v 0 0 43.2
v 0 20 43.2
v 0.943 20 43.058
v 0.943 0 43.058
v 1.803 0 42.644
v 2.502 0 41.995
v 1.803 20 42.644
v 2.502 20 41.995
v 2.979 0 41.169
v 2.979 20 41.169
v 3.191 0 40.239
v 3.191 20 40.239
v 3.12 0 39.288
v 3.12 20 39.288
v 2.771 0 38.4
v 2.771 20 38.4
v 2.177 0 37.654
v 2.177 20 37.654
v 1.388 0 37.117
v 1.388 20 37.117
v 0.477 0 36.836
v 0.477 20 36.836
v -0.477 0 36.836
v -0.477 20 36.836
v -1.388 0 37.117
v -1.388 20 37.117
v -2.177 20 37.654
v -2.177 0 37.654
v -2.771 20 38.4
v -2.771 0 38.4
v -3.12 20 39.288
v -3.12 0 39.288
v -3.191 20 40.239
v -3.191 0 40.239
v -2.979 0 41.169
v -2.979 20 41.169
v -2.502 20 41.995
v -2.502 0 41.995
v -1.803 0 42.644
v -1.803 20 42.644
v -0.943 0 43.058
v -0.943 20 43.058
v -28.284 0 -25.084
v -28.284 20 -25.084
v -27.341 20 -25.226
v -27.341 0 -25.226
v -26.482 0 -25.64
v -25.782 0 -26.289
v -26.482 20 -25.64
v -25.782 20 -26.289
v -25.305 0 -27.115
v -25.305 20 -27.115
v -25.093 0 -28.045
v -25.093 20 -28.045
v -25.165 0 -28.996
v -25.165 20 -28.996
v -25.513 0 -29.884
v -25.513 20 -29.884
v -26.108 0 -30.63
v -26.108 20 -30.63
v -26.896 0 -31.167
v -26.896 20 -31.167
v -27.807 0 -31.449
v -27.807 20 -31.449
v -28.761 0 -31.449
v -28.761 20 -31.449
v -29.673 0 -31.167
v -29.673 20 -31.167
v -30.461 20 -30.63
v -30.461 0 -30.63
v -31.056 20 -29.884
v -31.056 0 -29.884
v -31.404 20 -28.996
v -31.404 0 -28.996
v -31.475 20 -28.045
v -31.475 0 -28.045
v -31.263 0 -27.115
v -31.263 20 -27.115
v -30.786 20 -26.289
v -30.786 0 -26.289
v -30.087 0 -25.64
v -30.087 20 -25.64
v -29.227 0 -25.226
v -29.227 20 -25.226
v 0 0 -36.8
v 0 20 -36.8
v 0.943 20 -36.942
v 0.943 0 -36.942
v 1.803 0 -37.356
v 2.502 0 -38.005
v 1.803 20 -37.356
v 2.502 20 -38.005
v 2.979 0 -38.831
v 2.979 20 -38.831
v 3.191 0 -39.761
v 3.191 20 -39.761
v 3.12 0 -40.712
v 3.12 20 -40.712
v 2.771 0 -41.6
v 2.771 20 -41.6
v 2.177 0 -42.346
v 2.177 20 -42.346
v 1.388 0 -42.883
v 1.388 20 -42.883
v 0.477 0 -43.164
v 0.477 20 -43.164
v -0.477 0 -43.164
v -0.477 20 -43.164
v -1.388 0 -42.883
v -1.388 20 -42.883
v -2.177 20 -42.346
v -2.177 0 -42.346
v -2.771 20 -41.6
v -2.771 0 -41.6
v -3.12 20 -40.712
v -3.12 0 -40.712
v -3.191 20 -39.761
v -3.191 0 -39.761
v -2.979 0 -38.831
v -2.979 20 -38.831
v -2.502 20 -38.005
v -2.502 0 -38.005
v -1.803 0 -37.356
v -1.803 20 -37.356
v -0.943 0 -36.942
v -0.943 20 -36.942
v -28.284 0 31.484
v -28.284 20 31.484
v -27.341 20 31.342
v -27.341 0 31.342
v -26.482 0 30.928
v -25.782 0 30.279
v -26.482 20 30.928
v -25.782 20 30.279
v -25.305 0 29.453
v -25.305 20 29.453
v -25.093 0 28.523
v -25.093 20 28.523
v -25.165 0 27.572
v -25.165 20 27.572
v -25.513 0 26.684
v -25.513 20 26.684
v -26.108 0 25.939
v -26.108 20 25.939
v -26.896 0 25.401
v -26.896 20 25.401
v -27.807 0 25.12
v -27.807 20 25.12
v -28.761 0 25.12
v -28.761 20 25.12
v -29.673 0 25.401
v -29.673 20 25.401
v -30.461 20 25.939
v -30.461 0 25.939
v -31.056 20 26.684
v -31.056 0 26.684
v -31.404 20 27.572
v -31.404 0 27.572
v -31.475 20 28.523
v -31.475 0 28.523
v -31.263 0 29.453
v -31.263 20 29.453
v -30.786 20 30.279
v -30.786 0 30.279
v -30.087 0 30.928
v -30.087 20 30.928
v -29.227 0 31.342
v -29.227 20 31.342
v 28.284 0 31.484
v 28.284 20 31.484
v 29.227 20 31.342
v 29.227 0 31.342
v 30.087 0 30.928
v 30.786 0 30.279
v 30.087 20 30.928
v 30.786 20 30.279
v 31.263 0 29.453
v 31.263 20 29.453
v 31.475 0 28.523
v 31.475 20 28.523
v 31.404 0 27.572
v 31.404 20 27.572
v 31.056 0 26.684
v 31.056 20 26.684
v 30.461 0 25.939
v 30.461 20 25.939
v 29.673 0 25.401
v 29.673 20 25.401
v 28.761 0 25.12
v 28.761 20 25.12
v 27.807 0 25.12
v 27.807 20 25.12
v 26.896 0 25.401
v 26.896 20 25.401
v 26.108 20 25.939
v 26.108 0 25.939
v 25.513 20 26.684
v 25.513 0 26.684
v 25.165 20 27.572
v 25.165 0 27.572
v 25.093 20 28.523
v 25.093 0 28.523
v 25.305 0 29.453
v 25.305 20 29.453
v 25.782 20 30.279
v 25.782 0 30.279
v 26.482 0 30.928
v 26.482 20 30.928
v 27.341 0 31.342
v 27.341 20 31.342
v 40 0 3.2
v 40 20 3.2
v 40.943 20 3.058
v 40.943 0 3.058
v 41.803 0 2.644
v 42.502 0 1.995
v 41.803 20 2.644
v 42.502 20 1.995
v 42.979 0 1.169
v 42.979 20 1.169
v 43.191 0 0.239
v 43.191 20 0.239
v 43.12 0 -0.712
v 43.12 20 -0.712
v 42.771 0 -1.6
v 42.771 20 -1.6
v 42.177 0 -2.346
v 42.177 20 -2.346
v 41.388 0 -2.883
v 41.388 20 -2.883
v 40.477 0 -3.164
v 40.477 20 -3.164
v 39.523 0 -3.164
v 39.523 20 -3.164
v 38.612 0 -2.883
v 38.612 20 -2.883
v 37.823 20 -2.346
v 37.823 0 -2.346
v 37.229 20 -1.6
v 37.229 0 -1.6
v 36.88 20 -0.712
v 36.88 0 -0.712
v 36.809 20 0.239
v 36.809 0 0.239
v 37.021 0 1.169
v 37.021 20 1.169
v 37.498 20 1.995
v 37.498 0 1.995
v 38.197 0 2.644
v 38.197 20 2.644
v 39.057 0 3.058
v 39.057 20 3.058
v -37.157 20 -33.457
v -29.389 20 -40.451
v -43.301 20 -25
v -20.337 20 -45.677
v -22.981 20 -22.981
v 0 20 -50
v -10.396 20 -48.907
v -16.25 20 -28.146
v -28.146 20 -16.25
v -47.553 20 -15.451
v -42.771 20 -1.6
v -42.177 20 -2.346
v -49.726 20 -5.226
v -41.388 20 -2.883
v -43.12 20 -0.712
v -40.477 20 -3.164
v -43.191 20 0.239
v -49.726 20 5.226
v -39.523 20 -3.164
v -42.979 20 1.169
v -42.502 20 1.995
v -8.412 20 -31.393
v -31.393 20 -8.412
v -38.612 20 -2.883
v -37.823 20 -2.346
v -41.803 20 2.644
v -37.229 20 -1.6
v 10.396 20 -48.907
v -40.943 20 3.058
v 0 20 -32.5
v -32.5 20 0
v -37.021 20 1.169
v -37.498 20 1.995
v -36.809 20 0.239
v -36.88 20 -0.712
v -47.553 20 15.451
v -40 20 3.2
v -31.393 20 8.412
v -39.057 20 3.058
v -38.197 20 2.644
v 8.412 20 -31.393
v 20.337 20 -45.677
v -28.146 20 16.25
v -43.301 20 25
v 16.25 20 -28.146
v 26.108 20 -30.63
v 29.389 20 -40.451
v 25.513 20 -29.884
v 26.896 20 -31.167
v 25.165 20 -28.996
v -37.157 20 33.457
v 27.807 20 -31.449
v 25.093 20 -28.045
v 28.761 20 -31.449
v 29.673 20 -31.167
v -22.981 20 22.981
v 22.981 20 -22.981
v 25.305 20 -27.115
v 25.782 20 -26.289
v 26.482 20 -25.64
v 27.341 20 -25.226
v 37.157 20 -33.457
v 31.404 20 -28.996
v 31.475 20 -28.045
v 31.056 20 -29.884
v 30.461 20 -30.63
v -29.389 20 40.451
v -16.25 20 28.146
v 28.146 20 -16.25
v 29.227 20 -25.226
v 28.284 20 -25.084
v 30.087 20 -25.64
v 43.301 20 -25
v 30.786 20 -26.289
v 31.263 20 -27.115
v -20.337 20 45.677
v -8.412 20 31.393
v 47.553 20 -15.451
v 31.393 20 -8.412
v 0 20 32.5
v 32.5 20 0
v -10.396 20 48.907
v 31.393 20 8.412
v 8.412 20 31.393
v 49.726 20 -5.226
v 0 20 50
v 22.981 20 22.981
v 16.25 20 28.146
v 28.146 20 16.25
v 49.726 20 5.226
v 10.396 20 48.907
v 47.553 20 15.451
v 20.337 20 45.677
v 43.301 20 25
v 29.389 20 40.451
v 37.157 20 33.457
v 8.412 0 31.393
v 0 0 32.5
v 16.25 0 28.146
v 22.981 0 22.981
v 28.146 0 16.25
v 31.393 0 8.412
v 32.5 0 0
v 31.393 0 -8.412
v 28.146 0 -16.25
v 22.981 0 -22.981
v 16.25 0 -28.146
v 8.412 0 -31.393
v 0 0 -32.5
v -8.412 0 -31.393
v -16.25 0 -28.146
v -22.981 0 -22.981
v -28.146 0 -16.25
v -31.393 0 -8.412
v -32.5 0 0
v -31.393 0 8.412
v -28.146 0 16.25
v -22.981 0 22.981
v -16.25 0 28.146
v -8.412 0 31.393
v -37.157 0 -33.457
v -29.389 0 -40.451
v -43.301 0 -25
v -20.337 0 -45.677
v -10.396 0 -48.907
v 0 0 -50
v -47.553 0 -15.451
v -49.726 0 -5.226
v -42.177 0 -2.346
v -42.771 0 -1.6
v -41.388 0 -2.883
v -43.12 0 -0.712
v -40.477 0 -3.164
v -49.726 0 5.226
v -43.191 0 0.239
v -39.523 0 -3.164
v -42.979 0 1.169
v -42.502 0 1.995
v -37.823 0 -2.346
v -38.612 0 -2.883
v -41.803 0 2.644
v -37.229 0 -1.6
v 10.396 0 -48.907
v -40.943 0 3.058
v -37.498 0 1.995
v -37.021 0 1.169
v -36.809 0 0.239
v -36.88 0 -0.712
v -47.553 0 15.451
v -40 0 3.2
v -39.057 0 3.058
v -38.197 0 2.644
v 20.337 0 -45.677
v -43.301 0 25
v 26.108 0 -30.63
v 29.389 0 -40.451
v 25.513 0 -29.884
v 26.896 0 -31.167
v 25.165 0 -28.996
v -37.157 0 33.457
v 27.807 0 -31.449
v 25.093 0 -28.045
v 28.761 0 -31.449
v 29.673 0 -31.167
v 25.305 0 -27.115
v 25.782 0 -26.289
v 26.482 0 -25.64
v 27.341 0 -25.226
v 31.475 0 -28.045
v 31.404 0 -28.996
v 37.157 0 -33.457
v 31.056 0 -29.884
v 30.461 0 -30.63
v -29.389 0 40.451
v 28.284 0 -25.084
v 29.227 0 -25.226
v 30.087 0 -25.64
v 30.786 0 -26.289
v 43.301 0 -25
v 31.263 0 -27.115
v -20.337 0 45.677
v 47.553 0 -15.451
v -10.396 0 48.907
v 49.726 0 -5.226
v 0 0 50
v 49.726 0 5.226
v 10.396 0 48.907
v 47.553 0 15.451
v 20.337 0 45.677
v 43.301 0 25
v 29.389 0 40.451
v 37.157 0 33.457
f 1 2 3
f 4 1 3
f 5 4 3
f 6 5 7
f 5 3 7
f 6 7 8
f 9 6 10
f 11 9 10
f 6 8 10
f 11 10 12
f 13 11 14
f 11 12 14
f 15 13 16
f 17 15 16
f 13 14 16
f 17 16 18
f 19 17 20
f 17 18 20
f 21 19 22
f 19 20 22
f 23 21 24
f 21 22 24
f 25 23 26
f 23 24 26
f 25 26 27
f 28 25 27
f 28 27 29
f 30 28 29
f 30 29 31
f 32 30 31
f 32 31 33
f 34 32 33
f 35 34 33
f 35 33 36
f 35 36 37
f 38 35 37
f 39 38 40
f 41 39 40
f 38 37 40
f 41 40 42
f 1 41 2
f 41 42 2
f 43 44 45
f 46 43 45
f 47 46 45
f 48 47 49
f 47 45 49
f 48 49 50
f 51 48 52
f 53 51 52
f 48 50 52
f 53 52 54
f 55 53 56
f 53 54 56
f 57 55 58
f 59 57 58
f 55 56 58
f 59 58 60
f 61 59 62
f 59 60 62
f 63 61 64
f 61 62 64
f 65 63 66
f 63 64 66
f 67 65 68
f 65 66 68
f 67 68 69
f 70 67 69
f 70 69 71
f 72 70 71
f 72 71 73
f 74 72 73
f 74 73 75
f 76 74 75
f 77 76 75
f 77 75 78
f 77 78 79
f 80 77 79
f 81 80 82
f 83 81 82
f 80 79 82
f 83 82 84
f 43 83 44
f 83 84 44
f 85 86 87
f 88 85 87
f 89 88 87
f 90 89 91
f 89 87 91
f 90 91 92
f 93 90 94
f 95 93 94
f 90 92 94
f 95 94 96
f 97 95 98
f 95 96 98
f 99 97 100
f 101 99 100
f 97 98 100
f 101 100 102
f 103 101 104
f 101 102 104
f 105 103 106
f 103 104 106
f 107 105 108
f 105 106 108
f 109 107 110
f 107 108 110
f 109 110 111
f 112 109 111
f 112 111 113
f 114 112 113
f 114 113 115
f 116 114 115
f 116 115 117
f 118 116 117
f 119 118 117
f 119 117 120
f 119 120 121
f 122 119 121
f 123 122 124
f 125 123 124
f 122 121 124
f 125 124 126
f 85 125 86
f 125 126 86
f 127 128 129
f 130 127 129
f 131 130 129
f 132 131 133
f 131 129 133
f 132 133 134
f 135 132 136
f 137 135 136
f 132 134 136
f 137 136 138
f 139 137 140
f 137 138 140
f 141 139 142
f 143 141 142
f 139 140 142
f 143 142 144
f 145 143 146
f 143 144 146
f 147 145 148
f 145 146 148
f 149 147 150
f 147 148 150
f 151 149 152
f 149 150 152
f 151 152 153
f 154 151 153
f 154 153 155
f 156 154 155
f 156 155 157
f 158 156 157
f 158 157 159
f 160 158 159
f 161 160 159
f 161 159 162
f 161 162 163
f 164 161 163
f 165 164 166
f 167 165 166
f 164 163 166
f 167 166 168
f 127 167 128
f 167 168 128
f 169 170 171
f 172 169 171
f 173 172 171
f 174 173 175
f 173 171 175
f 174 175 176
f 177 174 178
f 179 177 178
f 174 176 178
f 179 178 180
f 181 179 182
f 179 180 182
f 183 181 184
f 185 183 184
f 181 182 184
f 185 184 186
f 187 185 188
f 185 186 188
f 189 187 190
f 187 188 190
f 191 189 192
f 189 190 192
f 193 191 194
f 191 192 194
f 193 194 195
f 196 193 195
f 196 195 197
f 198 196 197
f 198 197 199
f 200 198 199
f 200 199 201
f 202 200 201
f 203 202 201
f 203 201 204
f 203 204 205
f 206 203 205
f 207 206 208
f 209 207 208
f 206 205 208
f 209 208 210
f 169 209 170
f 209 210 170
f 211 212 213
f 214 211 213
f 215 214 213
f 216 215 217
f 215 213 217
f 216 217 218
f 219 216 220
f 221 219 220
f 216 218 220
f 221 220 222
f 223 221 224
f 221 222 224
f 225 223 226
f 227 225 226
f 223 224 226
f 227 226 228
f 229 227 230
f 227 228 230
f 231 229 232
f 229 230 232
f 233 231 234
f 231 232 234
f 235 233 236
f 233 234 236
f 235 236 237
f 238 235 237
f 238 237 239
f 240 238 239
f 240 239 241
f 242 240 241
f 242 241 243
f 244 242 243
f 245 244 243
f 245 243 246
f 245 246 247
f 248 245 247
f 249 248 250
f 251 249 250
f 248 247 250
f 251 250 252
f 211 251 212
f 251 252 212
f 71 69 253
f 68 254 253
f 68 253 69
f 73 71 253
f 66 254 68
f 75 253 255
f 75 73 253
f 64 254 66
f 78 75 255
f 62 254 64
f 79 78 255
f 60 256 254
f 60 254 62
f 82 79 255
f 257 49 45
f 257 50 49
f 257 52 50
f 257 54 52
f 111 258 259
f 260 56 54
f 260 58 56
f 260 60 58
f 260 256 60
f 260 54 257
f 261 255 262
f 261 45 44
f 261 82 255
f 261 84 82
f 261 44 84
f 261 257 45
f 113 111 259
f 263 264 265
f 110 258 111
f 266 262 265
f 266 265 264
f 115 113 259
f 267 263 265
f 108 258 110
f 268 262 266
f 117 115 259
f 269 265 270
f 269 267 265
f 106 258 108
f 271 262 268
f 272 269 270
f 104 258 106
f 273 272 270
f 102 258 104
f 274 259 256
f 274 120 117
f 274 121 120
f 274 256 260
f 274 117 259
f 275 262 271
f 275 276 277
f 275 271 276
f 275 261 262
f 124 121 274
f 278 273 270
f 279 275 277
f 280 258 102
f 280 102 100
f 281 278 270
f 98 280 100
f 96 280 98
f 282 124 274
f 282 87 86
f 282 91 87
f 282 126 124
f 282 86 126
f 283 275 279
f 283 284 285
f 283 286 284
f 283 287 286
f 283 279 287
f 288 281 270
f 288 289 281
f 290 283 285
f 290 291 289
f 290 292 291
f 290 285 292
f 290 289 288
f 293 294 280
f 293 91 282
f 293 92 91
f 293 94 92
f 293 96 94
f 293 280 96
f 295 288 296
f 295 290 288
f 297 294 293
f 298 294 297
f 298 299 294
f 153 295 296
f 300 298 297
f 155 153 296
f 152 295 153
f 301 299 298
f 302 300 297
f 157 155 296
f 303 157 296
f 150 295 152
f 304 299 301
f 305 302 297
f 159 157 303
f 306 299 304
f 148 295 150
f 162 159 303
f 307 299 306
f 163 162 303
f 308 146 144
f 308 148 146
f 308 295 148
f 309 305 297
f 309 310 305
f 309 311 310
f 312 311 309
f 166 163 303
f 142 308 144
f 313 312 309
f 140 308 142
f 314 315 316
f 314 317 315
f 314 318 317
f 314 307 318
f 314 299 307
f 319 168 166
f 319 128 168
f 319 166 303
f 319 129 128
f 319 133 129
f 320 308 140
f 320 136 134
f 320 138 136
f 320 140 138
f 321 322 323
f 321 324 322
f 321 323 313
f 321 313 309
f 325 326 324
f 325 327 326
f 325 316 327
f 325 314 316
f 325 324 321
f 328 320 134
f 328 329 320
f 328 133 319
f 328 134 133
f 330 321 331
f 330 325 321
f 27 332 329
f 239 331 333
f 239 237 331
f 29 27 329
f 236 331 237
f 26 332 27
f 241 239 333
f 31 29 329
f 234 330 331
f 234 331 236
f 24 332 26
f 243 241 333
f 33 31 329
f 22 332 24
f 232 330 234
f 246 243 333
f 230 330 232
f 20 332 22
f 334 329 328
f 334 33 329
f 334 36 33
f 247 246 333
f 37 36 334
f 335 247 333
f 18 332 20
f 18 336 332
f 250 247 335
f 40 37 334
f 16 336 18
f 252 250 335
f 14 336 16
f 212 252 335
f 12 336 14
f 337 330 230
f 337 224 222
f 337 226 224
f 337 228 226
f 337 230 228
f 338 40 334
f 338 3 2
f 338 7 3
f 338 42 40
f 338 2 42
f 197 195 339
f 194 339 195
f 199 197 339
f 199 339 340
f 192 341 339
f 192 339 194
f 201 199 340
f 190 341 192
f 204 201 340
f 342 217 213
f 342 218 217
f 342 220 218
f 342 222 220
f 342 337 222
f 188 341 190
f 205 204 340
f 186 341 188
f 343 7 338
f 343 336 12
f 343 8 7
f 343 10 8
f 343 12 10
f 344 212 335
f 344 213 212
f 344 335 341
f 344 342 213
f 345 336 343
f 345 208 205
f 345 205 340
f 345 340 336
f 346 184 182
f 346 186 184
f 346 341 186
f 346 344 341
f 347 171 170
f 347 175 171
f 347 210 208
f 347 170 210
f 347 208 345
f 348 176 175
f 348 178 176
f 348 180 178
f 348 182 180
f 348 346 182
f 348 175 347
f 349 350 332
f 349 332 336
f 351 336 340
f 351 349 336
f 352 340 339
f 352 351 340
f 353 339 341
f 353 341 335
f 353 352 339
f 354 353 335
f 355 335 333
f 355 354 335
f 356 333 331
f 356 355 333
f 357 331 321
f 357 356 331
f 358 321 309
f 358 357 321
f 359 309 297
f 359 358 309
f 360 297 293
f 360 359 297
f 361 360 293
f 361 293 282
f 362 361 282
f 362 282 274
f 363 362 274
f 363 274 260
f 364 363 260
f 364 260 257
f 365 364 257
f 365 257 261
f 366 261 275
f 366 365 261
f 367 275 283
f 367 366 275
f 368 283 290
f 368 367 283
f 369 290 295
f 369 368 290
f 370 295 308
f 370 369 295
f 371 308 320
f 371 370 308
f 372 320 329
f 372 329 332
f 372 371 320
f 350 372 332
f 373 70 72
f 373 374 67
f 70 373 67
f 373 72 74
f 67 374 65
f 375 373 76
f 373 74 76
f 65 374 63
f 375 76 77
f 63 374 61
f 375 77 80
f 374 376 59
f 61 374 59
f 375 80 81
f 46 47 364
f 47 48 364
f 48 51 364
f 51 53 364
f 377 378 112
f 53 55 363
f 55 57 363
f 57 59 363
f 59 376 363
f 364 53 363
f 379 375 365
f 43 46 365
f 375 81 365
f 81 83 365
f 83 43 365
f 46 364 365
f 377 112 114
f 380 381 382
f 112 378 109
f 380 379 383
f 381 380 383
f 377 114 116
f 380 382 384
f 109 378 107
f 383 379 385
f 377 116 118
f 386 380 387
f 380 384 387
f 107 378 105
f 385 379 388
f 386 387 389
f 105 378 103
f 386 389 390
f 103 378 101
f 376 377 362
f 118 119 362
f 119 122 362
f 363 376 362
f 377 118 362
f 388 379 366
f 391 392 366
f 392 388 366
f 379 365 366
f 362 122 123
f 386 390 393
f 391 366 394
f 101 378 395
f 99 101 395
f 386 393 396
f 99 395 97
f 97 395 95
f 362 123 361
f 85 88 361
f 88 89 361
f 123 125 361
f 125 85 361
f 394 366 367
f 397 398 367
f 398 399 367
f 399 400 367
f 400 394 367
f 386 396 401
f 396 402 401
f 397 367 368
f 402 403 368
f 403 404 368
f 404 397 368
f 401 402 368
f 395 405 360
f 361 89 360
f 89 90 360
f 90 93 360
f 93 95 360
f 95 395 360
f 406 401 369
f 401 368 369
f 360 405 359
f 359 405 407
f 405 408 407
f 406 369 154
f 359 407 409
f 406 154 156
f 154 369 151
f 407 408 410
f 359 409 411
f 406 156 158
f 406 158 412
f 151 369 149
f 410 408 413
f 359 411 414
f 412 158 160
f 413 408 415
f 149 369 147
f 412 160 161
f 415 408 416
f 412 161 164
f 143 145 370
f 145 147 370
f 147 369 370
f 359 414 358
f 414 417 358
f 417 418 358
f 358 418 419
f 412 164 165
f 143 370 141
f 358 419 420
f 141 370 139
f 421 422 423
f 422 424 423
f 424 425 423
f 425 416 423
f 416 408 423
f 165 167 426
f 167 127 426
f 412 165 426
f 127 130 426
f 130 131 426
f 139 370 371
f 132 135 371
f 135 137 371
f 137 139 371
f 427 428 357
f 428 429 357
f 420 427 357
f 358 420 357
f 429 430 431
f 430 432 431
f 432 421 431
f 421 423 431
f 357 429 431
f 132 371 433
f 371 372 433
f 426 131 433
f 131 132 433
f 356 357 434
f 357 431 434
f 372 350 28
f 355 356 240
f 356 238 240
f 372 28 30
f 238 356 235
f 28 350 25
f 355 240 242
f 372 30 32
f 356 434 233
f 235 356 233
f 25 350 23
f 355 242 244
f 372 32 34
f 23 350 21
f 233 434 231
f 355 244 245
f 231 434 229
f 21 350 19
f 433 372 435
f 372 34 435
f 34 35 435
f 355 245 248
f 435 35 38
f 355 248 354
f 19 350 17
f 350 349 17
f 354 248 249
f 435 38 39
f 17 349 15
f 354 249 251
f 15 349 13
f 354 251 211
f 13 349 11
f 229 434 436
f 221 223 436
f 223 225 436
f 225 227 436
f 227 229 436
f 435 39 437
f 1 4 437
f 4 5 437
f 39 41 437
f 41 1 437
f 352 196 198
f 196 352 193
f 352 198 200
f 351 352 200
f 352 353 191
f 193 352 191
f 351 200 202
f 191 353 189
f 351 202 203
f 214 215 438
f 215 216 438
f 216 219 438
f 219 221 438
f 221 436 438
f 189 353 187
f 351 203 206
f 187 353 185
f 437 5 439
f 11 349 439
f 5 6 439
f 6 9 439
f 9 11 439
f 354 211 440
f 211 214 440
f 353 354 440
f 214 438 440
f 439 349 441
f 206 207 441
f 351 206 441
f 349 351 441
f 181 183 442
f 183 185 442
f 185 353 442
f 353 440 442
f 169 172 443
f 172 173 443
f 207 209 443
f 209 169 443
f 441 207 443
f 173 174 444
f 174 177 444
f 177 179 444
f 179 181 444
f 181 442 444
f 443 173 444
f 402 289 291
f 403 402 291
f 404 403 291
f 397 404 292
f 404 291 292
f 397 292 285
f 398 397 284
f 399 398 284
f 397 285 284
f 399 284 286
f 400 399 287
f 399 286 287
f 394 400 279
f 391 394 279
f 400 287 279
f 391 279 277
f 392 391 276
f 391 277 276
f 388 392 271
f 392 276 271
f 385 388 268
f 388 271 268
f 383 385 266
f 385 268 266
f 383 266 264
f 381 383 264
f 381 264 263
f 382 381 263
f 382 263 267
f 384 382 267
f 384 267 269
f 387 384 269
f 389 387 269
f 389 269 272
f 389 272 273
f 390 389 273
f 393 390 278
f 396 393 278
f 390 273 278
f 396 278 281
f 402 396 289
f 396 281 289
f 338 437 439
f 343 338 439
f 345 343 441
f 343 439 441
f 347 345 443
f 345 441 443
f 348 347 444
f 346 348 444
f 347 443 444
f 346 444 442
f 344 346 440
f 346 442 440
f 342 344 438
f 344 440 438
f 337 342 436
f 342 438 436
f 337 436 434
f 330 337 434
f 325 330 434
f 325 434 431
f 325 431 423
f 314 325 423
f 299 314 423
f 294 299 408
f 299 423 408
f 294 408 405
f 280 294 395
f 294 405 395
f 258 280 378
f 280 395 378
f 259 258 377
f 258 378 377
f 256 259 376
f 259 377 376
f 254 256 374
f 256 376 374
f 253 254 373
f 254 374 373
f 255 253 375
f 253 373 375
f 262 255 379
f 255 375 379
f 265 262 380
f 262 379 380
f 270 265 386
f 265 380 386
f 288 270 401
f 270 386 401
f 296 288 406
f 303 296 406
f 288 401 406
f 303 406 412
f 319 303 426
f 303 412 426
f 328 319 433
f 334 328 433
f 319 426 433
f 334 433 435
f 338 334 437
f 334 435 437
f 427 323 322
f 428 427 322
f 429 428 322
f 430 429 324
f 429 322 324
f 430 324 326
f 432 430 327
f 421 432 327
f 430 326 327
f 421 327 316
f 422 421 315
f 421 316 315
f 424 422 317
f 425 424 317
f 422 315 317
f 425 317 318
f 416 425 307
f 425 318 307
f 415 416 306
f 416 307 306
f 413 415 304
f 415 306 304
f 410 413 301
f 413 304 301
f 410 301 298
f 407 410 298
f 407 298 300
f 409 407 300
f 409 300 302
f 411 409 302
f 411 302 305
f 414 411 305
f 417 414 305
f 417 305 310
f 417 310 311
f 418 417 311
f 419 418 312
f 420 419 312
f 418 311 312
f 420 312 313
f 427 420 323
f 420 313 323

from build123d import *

# Parameters (mm, degrees)
SKETCH_1_R          = 50
SKETCH_1_R_2        = 32.5
EXTRUDE_1_DEPTH     = 20
SKETCH_2_R          = 3.2
CUT_EXTRUDE_1_DEPTH = 20


with BuildPart() as part:
    # 草图1 → 凸台-拉伸1 (new body)
    with BuildSketch(Plane(origin=(0, 0, 0), x_dir=(1, 0, 0), z_dir=(0, 1, 0))):
        with Locations(Location((0, 0, 0), (0, 0, 270))):
            Circle(SKETCH_1_R)
        with Locations(Location((0, 0, 0), (0, 0, 270))):
            Circle(SKETCH_1_R_2, mode=Mode.SUBTRACT)
    extrude(amount=EXTRUDE_1_DEPTH)

    # 草图2 → 切除-拉伸1 (cut)
    with BuildSketch(Plane(origin=(0, 20, 0), x_dir=(1, 0, 0), z_dir=(0, 1, 0))):
        with Locations(Location((0, 40, 0), (0, 0, 270))):
            Circle(SKETCH_2_R)
        with Locations(Location((28.284271247, 28.284271247, 0), (0, 0, 270))):
            Circle(SKETCH_2_R)
        with Locations(Location((40, 0, 0), (0, 0, 270))):
            Circle(SKETCH_2_R)
        with Locations(Location((28.284271247, -28.284271247, 0), (0, 0, 270))):
            Circle(SKETCH_2_R)
        with Locations(Location((0, -40, 0), (0, 0, 270))):
            Circle(SKETCH_2_R)
        with Locations(Location((-28.284271247, -28.284271247, 0), (0, 0, 270))):
            Circle(SKETCH_2_R)
        with Locations(Location((-40, 0, 0), (0, 0, 270))):
            Circle(SKETCH_2_R)
        with Locations(Location((-28.284271247, 28.284271247, 0), (0, 0, 270))):
            Circle(SKETCH_2_R)
    extrude(amount=-CUT_EXTRUDE_1_DEPTH, mode=Mode.SUBTRACT)


solid = part.part
